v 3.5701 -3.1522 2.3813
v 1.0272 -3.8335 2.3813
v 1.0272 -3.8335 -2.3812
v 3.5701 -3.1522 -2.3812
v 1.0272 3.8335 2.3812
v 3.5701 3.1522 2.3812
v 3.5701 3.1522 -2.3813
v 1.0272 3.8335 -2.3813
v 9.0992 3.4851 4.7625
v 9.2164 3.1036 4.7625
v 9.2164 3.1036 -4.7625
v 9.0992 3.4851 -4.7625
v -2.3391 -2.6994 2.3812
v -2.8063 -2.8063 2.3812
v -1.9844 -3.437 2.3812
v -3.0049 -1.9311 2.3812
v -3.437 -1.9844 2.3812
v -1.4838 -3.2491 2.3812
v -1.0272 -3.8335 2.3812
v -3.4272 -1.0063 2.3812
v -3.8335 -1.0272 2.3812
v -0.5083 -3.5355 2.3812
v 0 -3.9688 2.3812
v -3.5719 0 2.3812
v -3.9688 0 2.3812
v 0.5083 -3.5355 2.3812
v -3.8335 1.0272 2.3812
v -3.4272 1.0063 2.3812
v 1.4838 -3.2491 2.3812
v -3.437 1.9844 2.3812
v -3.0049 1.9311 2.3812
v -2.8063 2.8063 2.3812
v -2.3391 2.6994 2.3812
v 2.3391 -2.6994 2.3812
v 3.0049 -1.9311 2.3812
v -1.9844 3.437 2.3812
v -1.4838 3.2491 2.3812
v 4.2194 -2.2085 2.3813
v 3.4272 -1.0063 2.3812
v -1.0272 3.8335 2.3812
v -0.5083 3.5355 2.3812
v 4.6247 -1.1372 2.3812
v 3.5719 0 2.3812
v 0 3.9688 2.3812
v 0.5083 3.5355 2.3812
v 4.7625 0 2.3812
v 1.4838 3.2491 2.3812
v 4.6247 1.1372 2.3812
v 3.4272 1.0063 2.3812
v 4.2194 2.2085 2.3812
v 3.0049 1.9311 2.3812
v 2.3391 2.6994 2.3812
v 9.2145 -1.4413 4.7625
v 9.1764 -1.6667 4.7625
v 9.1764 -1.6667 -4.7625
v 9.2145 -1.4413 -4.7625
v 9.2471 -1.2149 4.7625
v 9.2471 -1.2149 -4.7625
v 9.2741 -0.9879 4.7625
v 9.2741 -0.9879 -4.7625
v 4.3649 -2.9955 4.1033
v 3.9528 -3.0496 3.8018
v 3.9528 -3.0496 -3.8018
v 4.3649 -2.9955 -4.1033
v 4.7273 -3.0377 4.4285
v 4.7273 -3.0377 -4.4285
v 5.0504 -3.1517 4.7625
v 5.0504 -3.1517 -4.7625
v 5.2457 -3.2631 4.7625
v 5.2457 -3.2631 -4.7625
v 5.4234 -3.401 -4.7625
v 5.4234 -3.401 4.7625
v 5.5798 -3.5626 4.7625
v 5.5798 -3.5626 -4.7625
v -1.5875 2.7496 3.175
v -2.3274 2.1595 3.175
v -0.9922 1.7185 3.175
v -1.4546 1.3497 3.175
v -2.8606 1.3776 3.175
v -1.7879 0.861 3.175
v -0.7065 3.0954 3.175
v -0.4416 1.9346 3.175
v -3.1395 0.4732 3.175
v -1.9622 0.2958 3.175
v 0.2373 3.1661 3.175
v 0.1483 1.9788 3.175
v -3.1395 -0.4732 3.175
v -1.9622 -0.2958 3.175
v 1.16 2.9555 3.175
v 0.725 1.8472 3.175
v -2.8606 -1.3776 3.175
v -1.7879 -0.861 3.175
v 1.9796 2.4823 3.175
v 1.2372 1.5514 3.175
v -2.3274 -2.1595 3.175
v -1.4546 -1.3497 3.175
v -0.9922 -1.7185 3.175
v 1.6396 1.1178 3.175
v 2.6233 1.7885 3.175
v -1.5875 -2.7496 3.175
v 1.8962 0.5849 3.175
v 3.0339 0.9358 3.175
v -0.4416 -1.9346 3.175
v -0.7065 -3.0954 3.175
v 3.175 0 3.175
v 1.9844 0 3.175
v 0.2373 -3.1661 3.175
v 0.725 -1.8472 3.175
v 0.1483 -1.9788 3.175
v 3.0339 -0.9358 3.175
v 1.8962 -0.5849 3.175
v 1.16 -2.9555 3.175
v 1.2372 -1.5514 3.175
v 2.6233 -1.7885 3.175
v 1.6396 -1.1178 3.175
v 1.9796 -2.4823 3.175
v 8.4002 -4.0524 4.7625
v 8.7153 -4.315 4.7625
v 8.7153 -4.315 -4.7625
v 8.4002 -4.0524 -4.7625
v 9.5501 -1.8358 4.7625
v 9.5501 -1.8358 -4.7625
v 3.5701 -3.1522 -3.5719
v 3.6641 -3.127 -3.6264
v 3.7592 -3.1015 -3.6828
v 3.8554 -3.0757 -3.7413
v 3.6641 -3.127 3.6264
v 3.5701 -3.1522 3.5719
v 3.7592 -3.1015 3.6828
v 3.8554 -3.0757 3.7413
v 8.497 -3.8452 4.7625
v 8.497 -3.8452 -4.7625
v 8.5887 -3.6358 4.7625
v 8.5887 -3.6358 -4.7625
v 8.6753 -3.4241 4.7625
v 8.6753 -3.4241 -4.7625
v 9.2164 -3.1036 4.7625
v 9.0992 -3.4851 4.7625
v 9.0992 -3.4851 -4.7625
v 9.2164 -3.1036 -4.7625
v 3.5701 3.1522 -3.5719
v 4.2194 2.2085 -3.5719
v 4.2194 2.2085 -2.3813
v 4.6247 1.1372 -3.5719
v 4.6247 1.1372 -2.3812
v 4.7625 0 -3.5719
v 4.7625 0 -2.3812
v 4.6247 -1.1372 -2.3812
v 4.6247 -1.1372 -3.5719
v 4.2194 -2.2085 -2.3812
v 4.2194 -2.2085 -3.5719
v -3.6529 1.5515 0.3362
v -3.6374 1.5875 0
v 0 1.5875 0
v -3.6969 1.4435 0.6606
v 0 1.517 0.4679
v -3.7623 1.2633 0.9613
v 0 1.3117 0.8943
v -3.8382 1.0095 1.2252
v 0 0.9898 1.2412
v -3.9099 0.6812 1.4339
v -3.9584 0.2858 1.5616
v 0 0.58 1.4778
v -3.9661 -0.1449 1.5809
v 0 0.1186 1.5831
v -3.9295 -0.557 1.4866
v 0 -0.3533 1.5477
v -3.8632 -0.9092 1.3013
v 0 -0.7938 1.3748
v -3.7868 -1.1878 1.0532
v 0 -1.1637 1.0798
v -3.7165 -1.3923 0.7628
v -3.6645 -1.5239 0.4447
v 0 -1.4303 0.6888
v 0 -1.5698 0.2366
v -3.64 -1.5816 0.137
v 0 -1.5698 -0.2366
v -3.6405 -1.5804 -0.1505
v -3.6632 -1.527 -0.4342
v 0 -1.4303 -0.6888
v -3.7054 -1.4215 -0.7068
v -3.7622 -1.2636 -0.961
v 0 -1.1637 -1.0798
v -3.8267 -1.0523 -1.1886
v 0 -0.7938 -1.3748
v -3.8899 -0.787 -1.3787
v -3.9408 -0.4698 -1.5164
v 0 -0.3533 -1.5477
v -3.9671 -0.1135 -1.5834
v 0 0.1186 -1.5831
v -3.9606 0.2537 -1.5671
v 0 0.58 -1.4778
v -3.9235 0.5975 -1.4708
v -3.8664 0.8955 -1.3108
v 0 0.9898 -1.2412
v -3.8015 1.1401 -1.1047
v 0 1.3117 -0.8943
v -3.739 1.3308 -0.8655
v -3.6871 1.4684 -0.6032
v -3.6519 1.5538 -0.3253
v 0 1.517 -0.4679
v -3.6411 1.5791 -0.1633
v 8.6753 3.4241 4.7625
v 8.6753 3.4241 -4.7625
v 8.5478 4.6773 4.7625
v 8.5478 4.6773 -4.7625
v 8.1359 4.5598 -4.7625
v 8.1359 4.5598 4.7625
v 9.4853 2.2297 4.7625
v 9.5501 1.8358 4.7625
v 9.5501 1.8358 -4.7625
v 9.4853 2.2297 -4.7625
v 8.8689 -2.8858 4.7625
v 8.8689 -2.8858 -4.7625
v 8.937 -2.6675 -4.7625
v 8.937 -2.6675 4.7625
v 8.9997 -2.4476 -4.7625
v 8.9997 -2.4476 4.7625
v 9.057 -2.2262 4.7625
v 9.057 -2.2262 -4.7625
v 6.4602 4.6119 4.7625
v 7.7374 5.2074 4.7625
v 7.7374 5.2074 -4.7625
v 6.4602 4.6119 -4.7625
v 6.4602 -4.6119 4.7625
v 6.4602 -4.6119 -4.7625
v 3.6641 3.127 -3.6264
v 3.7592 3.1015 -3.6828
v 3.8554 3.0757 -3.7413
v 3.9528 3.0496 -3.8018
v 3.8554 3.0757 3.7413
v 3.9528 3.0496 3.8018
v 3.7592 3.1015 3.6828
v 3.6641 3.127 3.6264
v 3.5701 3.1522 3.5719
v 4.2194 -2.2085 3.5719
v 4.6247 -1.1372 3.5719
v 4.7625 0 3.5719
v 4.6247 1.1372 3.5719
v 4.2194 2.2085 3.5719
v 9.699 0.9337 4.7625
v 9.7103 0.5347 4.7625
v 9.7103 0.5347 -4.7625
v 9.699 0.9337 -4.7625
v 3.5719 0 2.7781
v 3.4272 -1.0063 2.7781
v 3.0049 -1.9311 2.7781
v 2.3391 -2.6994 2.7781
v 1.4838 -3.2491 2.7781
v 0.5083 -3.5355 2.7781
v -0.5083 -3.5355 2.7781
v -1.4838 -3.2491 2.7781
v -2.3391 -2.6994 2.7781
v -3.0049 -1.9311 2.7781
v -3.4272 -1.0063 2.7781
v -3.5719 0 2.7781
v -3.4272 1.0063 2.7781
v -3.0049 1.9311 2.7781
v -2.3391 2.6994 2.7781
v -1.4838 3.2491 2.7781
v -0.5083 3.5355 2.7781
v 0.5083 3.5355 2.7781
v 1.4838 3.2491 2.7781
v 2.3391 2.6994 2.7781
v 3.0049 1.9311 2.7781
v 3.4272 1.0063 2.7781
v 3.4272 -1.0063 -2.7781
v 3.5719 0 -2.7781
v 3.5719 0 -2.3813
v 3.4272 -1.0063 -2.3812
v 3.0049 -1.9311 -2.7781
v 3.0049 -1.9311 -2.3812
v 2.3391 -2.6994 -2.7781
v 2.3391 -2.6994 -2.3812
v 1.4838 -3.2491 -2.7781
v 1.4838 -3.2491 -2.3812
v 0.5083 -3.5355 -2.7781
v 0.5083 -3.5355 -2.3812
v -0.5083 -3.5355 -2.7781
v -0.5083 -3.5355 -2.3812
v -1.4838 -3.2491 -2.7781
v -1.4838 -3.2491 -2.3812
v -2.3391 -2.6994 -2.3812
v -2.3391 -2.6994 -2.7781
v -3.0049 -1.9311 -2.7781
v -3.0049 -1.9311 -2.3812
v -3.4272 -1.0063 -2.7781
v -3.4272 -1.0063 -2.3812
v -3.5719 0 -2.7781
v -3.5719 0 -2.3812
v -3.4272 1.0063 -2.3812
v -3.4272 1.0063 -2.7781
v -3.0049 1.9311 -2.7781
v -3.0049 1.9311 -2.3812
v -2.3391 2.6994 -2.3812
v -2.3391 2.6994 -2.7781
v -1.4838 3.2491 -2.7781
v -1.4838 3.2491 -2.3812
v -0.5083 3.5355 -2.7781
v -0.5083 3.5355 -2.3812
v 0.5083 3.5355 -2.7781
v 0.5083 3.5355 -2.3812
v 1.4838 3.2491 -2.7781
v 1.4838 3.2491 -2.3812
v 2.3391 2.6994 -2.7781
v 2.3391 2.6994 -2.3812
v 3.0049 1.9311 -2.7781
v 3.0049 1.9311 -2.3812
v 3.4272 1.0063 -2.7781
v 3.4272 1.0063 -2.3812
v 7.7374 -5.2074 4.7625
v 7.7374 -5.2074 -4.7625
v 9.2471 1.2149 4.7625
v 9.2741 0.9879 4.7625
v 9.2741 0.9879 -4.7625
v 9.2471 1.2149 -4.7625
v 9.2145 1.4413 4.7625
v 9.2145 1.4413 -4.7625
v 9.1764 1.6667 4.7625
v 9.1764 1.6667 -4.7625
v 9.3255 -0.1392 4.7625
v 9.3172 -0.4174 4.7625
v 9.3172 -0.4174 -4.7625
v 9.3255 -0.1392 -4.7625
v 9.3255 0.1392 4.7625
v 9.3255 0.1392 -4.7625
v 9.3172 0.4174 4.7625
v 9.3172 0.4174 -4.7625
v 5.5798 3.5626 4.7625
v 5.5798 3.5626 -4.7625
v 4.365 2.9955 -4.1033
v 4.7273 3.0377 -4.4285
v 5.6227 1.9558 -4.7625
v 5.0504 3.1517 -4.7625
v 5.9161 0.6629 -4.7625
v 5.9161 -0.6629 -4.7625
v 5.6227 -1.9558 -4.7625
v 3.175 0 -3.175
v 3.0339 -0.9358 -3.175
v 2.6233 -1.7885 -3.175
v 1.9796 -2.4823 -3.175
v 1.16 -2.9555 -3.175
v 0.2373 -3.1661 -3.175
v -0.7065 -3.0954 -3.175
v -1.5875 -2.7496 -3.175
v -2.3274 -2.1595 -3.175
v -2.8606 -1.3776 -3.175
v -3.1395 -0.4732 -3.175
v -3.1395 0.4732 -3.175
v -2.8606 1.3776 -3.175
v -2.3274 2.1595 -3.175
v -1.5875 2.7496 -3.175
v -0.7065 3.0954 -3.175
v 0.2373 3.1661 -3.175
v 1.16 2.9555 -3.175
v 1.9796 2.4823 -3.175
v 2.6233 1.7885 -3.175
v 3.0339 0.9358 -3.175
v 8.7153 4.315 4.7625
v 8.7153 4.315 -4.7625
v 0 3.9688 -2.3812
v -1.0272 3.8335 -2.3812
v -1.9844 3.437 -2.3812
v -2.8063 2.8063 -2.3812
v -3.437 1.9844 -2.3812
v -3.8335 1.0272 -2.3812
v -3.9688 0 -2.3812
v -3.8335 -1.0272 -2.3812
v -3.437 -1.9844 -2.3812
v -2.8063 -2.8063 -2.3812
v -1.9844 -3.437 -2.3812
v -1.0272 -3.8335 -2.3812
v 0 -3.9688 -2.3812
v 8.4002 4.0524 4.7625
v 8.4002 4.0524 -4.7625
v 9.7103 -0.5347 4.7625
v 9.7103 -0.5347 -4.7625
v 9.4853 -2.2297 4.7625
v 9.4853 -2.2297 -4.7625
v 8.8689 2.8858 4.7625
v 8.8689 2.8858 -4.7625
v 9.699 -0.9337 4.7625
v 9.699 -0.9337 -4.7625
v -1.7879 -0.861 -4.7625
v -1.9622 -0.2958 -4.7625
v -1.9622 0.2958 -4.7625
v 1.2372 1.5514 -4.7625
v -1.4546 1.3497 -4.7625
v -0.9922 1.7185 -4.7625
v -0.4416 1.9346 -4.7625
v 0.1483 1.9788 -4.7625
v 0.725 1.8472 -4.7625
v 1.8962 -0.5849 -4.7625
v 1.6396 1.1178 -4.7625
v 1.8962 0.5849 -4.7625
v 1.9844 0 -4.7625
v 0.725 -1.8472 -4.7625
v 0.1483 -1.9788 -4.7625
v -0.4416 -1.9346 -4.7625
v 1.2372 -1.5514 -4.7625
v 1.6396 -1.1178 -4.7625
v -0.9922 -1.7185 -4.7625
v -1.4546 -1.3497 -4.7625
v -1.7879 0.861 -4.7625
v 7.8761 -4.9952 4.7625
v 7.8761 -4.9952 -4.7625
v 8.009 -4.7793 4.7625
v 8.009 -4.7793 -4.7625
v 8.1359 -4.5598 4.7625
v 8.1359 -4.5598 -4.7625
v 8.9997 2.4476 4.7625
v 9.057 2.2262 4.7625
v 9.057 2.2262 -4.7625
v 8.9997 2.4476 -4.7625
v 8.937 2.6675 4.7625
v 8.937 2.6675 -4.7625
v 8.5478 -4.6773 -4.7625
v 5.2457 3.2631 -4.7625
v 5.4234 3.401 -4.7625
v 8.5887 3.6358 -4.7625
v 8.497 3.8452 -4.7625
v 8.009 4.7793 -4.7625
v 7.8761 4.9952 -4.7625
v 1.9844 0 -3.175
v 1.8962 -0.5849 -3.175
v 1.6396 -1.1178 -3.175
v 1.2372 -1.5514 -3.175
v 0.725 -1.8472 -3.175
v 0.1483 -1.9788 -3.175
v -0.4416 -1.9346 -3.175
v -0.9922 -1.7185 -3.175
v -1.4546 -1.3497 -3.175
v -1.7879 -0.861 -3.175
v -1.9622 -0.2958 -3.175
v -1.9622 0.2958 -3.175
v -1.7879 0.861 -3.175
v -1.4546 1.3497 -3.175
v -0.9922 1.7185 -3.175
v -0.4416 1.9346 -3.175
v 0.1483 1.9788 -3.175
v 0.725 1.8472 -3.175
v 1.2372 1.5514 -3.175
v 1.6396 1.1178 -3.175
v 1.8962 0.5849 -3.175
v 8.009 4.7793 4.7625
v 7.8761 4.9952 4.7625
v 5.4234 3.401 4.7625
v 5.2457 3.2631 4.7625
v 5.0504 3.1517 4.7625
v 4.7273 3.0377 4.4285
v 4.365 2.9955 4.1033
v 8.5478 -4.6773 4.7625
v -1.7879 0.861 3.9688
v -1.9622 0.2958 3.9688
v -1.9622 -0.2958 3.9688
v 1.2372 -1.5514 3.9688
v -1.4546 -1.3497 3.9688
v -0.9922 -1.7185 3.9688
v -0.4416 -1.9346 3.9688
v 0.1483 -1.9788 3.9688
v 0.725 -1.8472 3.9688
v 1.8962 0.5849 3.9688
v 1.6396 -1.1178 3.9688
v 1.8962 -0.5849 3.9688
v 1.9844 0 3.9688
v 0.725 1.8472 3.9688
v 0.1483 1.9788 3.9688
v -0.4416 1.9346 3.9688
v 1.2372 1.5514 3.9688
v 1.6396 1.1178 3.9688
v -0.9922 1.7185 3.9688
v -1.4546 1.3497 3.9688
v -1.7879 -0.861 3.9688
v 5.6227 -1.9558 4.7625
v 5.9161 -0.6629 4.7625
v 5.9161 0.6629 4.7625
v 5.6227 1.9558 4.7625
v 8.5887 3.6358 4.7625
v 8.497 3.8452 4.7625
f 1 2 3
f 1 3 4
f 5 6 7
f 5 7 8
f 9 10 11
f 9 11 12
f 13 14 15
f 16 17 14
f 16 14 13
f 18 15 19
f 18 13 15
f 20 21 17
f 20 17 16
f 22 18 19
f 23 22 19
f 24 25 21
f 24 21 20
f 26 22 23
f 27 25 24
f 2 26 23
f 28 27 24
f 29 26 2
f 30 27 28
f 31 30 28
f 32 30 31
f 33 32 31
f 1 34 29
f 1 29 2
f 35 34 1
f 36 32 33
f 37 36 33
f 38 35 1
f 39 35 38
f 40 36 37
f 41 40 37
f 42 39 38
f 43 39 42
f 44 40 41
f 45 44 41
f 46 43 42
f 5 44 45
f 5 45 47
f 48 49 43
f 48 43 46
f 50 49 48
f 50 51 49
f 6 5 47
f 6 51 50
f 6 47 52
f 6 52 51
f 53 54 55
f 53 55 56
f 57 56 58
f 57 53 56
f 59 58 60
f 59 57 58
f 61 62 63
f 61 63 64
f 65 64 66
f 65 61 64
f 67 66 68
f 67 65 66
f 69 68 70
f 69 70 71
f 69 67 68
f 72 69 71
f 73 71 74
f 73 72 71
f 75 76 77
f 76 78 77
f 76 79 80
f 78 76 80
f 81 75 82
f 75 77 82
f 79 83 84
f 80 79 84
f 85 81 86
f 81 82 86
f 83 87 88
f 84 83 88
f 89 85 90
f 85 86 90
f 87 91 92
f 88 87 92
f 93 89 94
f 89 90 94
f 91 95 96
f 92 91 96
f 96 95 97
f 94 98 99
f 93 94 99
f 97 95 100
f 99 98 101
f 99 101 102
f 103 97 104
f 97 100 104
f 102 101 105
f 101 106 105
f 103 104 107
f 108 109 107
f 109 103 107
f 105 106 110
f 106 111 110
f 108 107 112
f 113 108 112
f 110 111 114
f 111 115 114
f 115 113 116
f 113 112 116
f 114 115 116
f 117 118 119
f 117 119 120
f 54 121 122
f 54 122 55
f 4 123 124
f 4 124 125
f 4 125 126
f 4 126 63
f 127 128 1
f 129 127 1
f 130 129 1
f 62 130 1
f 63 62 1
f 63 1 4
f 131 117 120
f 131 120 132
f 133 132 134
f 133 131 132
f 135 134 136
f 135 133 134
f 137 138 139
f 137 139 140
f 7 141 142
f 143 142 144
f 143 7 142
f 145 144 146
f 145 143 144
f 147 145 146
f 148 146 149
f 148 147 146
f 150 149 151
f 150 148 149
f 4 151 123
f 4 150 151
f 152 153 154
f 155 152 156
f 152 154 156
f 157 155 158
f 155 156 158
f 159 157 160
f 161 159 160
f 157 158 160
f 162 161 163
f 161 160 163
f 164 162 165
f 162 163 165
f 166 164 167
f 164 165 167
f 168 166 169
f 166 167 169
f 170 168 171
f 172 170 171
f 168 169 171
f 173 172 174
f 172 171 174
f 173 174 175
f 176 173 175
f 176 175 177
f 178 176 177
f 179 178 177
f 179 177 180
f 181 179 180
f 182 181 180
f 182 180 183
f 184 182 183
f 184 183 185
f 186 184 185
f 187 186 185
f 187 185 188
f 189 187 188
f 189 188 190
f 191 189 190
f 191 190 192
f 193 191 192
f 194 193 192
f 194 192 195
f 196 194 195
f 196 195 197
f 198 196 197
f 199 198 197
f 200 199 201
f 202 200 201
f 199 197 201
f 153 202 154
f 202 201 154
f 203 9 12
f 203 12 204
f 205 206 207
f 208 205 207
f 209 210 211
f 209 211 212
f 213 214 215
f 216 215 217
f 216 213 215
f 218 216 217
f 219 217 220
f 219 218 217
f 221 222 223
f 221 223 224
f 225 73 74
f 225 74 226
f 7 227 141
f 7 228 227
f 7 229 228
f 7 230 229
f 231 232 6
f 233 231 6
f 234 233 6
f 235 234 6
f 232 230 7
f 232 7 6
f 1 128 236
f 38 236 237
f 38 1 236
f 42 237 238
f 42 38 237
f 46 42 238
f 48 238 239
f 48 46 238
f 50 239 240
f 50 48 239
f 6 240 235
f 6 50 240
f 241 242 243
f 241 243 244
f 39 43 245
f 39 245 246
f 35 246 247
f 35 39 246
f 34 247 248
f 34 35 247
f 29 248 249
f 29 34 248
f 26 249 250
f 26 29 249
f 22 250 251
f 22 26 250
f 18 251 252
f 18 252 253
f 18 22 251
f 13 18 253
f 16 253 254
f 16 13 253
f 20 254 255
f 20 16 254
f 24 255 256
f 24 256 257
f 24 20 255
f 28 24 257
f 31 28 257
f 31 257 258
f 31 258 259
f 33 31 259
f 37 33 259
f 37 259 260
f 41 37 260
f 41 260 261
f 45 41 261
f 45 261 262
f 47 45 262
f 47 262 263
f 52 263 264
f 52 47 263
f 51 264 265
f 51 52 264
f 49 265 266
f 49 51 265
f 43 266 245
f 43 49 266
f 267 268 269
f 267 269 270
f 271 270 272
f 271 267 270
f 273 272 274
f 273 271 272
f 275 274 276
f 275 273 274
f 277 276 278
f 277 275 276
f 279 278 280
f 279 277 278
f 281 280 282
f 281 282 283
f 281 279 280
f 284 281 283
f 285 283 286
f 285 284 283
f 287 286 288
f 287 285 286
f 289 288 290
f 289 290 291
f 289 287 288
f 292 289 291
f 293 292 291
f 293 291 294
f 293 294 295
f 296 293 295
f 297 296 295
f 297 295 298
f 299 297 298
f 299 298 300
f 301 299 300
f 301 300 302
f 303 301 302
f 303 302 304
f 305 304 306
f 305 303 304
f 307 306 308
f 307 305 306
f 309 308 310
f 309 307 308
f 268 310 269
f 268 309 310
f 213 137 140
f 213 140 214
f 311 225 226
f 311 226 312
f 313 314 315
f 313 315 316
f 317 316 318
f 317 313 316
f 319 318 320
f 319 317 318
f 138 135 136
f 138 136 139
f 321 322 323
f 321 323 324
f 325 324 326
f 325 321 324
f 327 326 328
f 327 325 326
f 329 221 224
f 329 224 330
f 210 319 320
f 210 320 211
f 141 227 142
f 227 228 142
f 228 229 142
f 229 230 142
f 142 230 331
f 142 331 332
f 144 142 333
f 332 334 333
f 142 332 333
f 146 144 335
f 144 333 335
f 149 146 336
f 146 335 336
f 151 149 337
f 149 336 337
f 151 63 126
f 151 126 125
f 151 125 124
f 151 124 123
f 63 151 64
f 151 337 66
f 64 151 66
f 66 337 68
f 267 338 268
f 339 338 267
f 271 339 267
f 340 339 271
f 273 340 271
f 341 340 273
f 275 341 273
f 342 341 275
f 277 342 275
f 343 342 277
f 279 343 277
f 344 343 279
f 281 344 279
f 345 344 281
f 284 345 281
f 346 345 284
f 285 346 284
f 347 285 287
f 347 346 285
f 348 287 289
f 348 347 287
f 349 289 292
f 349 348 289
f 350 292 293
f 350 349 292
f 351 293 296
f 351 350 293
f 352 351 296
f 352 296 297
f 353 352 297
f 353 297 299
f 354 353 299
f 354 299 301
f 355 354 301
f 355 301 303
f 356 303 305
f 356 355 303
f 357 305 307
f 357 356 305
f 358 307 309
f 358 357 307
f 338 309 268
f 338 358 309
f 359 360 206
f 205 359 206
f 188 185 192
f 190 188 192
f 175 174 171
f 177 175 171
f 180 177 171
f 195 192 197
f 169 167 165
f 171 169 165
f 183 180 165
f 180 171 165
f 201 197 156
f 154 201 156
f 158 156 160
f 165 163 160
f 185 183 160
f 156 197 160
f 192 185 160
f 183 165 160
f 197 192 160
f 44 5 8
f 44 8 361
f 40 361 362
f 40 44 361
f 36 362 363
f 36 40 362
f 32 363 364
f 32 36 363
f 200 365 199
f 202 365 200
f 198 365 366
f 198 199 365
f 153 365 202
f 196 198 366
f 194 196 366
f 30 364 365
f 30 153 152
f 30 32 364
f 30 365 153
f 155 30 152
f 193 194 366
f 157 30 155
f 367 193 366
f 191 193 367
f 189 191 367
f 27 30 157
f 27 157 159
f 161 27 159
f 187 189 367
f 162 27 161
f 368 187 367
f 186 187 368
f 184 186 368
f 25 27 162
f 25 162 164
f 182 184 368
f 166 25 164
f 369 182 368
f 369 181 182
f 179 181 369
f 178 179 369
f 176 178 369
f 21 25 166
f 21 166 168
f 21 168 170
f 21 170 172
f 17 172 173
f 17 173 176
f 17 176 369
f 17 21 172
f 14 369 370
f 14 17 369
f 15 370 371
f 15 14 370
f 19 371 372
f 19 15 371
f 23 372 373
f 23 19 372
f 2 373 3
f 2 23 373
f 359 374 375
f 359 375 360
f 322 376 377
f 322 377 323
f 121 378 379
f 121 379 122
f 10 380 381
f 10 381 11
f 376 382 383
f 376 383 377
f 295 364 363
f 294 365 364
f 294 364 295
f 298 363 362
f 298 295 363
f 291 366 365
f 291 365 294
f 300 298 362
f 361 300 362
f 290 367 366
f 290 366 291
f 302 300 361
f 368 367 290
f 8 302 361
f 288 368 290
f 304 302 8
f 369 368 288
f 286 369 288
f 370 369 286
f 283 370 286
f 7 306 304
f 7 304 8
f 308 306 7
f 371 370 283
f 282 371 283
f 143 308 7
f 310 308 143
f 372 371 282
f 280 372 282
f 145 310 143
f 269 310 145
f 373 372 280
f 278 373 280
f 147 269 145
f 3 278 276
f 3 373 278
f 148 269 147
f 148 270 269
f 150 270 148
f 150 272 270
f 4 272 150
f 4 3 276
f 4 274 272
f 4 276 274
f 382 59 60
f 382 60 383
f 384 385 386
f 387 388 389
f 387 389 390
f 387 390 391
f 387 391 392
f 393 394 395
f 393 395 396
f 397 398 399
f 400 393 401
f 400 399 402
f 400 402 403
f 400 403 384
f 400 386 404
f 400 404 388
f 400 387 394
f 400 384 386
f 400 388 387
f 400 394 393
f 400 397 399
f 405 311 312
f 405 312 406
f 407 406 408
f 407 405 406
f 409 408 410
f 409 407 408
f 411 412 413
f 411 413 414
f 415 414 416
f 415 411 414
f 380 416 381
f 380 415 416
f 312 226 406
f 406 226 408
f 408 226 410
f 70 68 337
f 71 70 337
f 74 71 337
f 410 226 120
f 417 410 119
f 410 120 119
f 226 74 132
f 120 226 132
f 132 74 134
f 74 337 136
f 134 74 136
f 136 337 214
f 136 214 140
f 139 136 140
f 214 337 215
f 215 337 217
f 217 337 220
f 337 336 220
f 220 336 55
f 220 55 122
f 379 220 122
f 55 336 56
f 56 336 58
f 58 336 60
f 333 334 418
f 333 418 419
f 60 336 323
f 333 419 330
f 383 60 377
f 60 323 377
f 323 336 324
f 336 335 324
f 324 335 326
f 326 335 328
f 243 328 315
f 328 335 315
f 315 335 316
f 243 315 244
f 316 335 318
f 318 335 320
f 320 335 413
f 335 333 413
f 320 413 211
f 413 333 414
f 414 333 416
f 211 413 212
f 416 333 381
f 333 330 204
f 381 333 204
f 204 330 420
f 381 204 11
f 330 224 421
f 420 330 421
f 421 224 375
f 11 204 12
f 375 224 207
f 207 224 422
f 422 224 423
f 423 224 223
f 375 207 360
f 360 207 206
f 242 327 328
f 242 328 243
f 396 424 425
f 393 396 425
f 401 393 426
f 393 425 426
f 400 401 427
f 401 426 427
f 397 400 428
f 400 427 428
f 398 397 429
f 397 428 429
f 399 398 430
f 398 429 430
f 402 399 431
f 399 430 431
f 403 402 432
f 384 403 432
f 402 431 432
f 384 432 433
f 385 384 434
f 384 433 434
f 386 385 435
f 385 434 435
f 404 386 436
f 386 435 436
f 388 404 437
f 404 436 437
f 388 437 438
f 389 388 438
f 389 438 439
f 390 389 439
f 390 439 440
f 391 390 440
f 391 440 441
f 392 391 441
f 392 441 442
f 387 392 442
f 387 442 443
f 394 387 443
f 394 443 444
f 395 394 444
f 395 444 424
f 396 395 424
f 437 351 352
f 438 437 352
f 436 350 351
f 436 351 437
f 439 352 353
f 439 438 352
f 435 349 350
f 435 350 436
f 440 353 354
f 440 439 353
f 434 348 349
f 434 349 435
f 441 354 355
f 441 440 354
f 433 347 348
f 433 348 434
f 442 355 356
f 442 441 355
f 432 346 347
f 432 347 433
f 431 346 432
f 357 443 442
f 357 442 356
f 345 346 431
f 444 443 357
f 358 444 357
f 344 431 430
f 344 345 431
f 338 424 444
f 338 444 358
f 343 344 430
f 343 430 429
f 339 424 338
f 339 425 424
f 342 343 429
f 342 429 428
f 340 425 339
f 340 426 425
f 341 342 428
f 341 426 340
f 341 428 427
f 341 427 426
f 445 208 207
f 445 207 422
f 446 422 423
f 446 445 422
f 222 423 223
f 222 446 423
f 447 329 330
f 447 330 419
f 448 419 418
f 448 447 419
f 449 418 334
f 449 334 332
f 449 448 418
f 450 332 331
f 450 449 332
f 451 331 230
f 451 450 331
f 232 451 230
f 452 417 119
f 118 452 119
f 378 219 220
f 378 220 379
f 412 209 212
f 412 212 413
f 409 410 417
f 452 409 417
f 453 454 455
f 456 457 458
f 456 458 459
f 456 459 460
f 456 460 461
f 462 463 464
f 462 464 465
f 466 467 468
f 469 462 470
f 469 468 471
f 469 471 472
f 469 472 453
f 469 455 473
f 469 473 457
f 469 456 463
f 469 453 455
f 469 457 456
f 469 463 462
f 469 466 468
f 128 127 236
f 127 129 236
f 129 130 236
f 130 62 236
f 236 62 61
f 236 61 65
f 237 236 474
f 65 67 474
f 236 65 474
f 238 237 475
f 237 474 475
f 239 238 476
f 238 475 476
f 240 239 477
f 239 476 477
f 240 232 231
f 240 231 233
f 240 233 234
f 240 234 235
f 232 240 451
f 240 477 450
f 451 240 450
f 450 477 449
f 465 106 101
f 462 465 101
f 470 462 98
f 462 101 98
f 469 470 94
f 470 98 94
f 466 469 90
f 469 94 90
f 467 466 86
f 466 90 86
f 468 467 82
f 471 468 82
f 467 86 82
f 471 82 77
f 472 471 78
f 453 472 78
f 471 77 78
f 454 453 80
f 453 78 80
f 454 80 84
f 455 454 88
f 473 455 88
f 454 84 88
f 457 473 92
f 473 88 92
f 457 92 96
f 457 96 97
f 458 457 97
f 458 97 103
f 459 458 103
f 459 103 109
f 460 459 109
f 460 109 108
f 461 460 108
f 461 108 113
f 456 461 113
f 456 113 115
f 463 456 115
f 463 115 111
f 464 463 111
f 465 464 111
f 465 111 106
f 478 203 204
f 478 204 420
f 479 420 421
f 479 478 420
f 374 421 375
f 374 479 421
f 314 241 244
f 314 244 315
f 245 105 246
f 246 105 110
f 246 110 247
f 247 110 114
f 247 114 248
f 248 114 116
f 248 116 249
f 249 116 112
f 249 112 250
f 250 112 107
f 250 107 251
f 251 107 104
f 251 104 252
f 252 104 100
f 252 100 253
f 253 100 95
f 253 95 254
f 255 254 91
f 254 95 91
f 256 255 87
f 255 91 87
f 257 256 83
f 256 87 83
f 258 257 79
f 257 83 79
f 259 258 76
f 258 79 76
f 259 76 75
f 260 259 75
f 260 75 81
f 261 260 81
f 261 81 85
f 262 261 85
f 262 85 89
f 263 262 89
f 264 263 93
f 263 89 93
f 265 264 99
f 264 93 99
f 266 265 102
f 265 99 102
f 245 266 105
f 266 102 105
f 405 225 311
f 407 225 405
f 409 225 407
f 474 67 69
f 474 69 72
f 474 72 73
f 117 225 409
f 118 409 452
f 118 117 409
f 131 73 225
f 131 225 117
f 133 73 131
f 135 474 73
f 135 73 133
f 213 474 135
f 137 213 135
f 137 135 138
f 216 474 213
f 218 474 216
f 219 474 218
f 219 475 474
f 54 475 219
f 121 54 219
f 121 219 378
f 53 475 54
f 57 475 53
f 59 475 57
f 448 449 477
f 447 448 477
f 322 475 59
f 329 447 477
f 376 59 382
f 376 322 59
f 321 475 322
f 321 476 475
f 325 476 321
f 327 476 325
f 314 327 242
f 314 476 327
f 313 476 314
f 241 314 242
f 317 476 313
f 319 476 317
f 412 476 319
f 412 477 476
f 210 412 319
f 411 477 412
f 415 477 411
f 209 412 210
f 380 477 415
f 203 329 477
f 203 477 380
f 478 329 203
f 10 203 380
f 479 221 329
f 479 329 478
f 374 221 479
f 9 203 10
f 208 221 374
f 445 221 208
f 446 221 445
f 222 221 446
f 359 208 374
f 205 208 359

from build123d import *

# Parameters (mm, degrees)
F0_R      = 3.571875
F0_R_2    = 1.984375
F1_DEPTH  = 4.7625
F3_R      = 4.7625
F4_DEPTH  = 6.35
F7_R      = 4.7625
F8_DEPTH  = 4.29937
F9_R      = 3.571875
F10_DEPTH = 3.175
F11_R     = 1.984375
F12_DEPTH = 1.5875
F13_R     = 1.984375
F14_DEPTH = 2.38125
F15_R     = 1.5875
F16_DEPTH = 8.64375
F17_SIZE2 = 1.190625
F17_SIZE  = 1.190625
F18_SIZE2 = 1.190625
F18_SIZE  = 1.190625
F19_SIZE2 = 0.396875
F19_SIZE  = 0.396875
F20_SIZE2 = 0.396875
F20_SIZE  = 0.396875


with BuildPart() as f1:
    # F0 (on Top) → F1 (new body, symmetric)
    with BuildSketch(Plane.XY):
        with BuildLine():
            ThreePointArc((1.0271880853, 3.8335181231), (-3.96875, 0), (1.0271880853, -3.8335181231))
            ThreePointArc((1.0271880853, -3.8335181231), (3.1486210693, -2.4160219214), (3.96875, 0))
            ThreePointArc((3.96875, 0), (3.1486210693, 2.4160219214), (1.0271880853, 3.8335181231))
        make_face()
        Circle(F0_R, mode=Mode.SUBTRACT)
        Circle(F0_R)
        Circle(F0_R_2, mode=Mode.SUBTRACT)
        with BuildLine():
            ThreePointArc((3.5700563335, 3.1521586295), (4.7625, 0), (3.5700563335, -3.1521586295))
            Line((3.5700563335, -3.1521586295), (3.952808412, -3.0496005192))
            ThreePointArc((3.952808412, -3.0496005192), (4.8410541028, -3.0689821091), (5.5797791996, -3.562582438))
            Line((5.5797791996, -3.562582438), (6.4602323301, -4.6118656194))
            ThreePointArc((6.4602323301, -4.6118656194), (7.9375, 0), (6.4602323301, 4.6118656194))
            Line((6.4602323301, 4.6118656194), (5.5797791996, 3.562582438))
            ThreePointArc((5.5797791996, 3.562582438), (4.8410541028, 3.0689821091), (3.952808412, 3.0496005192))
            Line((3.952808412, 3.0496005192), (3.5700563335, 3.1521586295))
        make_face()
        with BuildLine():
            ThreePointArc((6.4602323301, 4.6118656194), (7.9375, 0), (6.4602323301, -4.6118656194))
            Line((6.4602323301, -4.6118656194), (7.7374098345, -5.2074232706))
            ThreePointArc((7.7374098345, -5.2074232706), (7.9432604057, -4.8876765639), (8.1359052848, -4.5598040816))
            ThreePointArc((8.1359052848, -4.5598040816), (8.2719379074, -4.3081099477), (8.4001864325, -4.0523617762))
            ThreePointArc((8.4001864325, -4.0523617762), (8.5434987657, -3.7407749072), (8.6752581872, -3.4241295905))
            ThreePointArc((8.6752581872, -3.4241295905), (8.7762030429, -3.1564264946), (8.8688892752, -2.8857531236))
            ThreePointArc((8.8688892752, -2.8857531236), (8.9689923796, -2.5577223777), (9.0569672002, -2.226232962))
            ThreePointArc((9.0569672002, -2.226232962), (9.1209899529, -1.9473855153), (9.1764296292, -1.6667055307))
            ThreePointArc((9.1764296292, -1.6667055307), (9.2315044647, -1.3281917728), (9.2740960354, -0.987881973))
            ThreePointArc((9.2740960354, -0.987881973), (9.3000332851, -0.7029572979), (9.3172189742, -0.4173711225))
            ThreePointArc((9.3172189742, -0.4173711225), (9.3265625, 0), (9.3172189742, 0.4173711225))
            ThreePointArc((9.3172189742, 0.4173711225), (9.3000332851, 0.7029572979), (9.2740960354, 0.987881973))
            ThreePointArc((9.2740960354, 0.987881973), (9.2315044647, 1.3281917728), (9.1764296292, 1.6667055307))
            ThreePointArc((9.1764296292, 1.6667055307), (9.1209899529, 1.9473855153), (9.0569672002, 2.226232962))
            ThreePointArc((9.0569672002, 2.226232962), (8.9689923796, 2.5577223777), (8.8688892752, 2.8857531236))
            ThreePointArc((8.8688892752, 2.8857531236), (8.7762030429, 3.1564264946), (8.6752581872, 3.4241295905))
            ThreePointArc((8.6752581872, 3.4241295905), (8.5434987657, 3.7407749072), (8.4001864325, 4.0523617762))
            ThreePointArc((8.4001864325, 4.0523617762), (8.2719379074, 4.3081099477), (8.1359052848, 4.5598040816))
            ThreePointArc((8.1359052848, 4.5598040816), (7.9432604057, 4.8876765639), (7.7374098345, 5.2074232706))
            Line((7.7374098345, 5.2074232706), (6.4602323301, 4.6118656194))
        make_face()
        Circle(F0_R_2)
        with BuildLine():
            Line((1.0271880853, -3.8335181231), (3.5700563335, -3.1521586295))
            ThreePointArc((3.5700563335, -3.1521586295), (4.7625, 0), (3.5700563335, 3.1521586295))
            Line((3.5700563335, 3.1521586295), (1.0271880853, 3.8335181231))
            ThreePointArc((1.0271880853, 3.8335181231), (3.1486210693, 2.4160219214), (3.96875, 0))
            ThreePointArc((3.96875, 0), (3.1486210693, -2.4160219214), (1.0271880853, -3.8335181231))
        make_face()
        with BuildLine():
            ThreePointArc((8.4001864325, -4.0523617762), (8.2719379074, -4.3081099477), (8.1359052848, -4.5598040816))
            Line((8.1359052848, -4.5598040816), (8.5478055324, -4.6772757471))
            Line((8.5478055324, -4.6772757471), (8.7152809502, -4.3149690254))
            Line((8.7152809502, -4.3149690254), (8.4001864325, -4.0523617762))
        make_face()
        with BuildLine():
            ThreePointArc((8.8688892752, -2.8857531236), (8.7762030429, -3.1564264946), (8.6752581872, -3.4241295905))
            Line((8.6752581872, -3.4241295905), (9.0992154205, -3.4851350856))
            Line((9.0992154205, -3.4851350856), (9.216440462, -3.1035954864))
            Line((9.216440462, -3.1035954864), (8.8688892752, -2.8857531236))
        make_face()
        with BuildLine():
            ThreePointArc((9.1764296292, -1.6667055307), (9.1209899529, -1.9473855153), (9.0569672002, -2.226232962))
            Line((9.0569672002, -2.226232962), (9.4852774103, -2.2296637155))
            Line((9.4852774103, -2.2296637155), (9.5501219011, -1.8358244486))
            Line((9.5501219011, -1.8358244486), (9.1764296292, -1.6667055307))
        make_face()
        with BuildLine():
            ThreePointArc((9.3172189742, -0.4173711225), (9.3000332851, -0.7029572979), (9.2740960354, -0.987881973))
            Line((9.2740960354, -0.987881973), (9.6989761124, -0.9336756422))
            Line((9.6989761124, -0.9336756422), (9.7102617202, -0.5346934231))
            Line((9.7102617202, -0.5346934231), (9.3172189742, -0.4173711225))
        make_face()
        with BuildLine():
            Line((9.6989761124, 0.9336756422), (9.2740960354, 0.987881973))
            ThreePointArc((9.2740960354, 0.987881973), (9.3000332851, 0.7029572979), (9.3172189742, 0.4173711225))
            Line((9.3172189742, 0.4173711225), (9.7102617202, 0.5346934231))
            Line((9.7102617202, 0.5346934231), (9.6989761124, 0.9336756422))
        make_face()
        with BuildLine():
            Line((9.4852774103, 2.2296637155), (9.0569672002, 2.226232962))
            ThreePointArc((9.0569672002, 2.226232962), (9.1209899529, 1.9473855153), (9.1764296292, 1.6667055307))
            Line((9.1764296292, 1.6667055307), (9.5501219011, 1.8358244486))
            Line((9.5501219011, 1.8358244486), (9.4852774103, 2.2296637155))
        make_face()
        with BuildLine():
            Line((9.0992154205, 3.4851350856), (8.6752581872, 3.4241295905))
            ThreePointArc((8.6752581872, 3.4241295905), (8.7762030429, 3.1564264946), (8.8688892752, 2.8857531236))
            Line((8.8688892752, 2.8857531236), (9.216440462, 3.1035954864))
            Line((9.216440462, 3.1035954864), (9.0992154205, 3.4851350856))
        make_face()
        with BuildLine():
            Line((8.5478055324, 4.6772757471), (8.1359052848, 4.5598040816))
            ThreePointArc((8.1359052848, 4.5598040816), (8.2719379074, 4.3081099477), (8.4001864325, 4.0523617762))
            Line((8.4001864325, 4.0523617762), (8.7152809502, 4.3149690254))
            Line((8.7152809502, 4.3149690254), (8.5478055324, 4.6772757471))
        make_face()
    extrude(amount=F1_DEPTH, both=True)

    # F3 (on offset) → F4 (cut)
    with BuildSketch(Plane.XY.offset(2.38125)):
        Circle(F3_R)
    extrude(amount=F4_DEPTH, mode=Mode.SUBTRACT)

    # F7 (on offset) → F8 (cut)
    with BuildSketch(Plane(origin=(0, 0, -2.38125), x_dir=(1, 0, 0), z_dir=(0, 0, -1))):
        Circle(F7_R)
    extrude(amount=F8_DEPTH, mode=Mode.SUBTRACT)

    # F9 (on offset) → F10 (join, symmetric)
    with BuildSketch(Plane(origin=(0, 0, 0), x_dir=(1, 0, 0), z_dir=(0, 0, -1))):
        Circle(F9_R)
    extrude(amount=F10_DEPTH, both=True)

    # F11 (on offset) → F12 (join)
    with BuildSketch(Plane.XY.offset(2.38125)):
        Circle(F11_R)
    extrude(amount=F12_DEPTH)

    # F13 (on offset) → F14 (join)
    with BuildSketch(Plane(origin=(0, 0, -2.38125), x_dir=(1, 0, 0), z_dir=(0, 0, -1))):
        Circle(F13_R)
    extrude(amount=F14_DEPTH)

    # F15 (on Right) → F16 (cut)
    with BuildSketch(Plane.YZ):
        Circle(F15_R)
    extrude(amount=-F16_DEPTH, mode=Mode.SUBTRACT)

    # F17
    f17_edges = [f1.edges().sort_by_distance(p)[0] for p in [
        (4.7625, 0, 4.7625),
    ]]
    chamfer(f17_edges, length=F17_SIZE, length2=F17_SIZE2)

    # F18
    f18_edges = [f1.edges().sort_by_distance(p)[0] for p in [
        (4.7625, 0, -4.7625),
    ]]
    chamfer(f18_edges, length=F18_SIZE, length2=F18_SIZE2)

    # F19
    f19_edges = [f1.edges().sort_by_distance(p)[0] for p in [
        (-3.571875, 0, 3.175),
    ]]
    chamfer(f19_edges, length=F19_SIZE, length2=F19_SIZE2)

    # F20
    f20_edges = [f1.edges().sort_by_distance(p)[0] for p in [
        (-3.571875, 0, -3.175),
    ]]
    chamfer(f20_edges, length=F20_SIZE, length2=F20_SIZE2)


solid = f1.part
